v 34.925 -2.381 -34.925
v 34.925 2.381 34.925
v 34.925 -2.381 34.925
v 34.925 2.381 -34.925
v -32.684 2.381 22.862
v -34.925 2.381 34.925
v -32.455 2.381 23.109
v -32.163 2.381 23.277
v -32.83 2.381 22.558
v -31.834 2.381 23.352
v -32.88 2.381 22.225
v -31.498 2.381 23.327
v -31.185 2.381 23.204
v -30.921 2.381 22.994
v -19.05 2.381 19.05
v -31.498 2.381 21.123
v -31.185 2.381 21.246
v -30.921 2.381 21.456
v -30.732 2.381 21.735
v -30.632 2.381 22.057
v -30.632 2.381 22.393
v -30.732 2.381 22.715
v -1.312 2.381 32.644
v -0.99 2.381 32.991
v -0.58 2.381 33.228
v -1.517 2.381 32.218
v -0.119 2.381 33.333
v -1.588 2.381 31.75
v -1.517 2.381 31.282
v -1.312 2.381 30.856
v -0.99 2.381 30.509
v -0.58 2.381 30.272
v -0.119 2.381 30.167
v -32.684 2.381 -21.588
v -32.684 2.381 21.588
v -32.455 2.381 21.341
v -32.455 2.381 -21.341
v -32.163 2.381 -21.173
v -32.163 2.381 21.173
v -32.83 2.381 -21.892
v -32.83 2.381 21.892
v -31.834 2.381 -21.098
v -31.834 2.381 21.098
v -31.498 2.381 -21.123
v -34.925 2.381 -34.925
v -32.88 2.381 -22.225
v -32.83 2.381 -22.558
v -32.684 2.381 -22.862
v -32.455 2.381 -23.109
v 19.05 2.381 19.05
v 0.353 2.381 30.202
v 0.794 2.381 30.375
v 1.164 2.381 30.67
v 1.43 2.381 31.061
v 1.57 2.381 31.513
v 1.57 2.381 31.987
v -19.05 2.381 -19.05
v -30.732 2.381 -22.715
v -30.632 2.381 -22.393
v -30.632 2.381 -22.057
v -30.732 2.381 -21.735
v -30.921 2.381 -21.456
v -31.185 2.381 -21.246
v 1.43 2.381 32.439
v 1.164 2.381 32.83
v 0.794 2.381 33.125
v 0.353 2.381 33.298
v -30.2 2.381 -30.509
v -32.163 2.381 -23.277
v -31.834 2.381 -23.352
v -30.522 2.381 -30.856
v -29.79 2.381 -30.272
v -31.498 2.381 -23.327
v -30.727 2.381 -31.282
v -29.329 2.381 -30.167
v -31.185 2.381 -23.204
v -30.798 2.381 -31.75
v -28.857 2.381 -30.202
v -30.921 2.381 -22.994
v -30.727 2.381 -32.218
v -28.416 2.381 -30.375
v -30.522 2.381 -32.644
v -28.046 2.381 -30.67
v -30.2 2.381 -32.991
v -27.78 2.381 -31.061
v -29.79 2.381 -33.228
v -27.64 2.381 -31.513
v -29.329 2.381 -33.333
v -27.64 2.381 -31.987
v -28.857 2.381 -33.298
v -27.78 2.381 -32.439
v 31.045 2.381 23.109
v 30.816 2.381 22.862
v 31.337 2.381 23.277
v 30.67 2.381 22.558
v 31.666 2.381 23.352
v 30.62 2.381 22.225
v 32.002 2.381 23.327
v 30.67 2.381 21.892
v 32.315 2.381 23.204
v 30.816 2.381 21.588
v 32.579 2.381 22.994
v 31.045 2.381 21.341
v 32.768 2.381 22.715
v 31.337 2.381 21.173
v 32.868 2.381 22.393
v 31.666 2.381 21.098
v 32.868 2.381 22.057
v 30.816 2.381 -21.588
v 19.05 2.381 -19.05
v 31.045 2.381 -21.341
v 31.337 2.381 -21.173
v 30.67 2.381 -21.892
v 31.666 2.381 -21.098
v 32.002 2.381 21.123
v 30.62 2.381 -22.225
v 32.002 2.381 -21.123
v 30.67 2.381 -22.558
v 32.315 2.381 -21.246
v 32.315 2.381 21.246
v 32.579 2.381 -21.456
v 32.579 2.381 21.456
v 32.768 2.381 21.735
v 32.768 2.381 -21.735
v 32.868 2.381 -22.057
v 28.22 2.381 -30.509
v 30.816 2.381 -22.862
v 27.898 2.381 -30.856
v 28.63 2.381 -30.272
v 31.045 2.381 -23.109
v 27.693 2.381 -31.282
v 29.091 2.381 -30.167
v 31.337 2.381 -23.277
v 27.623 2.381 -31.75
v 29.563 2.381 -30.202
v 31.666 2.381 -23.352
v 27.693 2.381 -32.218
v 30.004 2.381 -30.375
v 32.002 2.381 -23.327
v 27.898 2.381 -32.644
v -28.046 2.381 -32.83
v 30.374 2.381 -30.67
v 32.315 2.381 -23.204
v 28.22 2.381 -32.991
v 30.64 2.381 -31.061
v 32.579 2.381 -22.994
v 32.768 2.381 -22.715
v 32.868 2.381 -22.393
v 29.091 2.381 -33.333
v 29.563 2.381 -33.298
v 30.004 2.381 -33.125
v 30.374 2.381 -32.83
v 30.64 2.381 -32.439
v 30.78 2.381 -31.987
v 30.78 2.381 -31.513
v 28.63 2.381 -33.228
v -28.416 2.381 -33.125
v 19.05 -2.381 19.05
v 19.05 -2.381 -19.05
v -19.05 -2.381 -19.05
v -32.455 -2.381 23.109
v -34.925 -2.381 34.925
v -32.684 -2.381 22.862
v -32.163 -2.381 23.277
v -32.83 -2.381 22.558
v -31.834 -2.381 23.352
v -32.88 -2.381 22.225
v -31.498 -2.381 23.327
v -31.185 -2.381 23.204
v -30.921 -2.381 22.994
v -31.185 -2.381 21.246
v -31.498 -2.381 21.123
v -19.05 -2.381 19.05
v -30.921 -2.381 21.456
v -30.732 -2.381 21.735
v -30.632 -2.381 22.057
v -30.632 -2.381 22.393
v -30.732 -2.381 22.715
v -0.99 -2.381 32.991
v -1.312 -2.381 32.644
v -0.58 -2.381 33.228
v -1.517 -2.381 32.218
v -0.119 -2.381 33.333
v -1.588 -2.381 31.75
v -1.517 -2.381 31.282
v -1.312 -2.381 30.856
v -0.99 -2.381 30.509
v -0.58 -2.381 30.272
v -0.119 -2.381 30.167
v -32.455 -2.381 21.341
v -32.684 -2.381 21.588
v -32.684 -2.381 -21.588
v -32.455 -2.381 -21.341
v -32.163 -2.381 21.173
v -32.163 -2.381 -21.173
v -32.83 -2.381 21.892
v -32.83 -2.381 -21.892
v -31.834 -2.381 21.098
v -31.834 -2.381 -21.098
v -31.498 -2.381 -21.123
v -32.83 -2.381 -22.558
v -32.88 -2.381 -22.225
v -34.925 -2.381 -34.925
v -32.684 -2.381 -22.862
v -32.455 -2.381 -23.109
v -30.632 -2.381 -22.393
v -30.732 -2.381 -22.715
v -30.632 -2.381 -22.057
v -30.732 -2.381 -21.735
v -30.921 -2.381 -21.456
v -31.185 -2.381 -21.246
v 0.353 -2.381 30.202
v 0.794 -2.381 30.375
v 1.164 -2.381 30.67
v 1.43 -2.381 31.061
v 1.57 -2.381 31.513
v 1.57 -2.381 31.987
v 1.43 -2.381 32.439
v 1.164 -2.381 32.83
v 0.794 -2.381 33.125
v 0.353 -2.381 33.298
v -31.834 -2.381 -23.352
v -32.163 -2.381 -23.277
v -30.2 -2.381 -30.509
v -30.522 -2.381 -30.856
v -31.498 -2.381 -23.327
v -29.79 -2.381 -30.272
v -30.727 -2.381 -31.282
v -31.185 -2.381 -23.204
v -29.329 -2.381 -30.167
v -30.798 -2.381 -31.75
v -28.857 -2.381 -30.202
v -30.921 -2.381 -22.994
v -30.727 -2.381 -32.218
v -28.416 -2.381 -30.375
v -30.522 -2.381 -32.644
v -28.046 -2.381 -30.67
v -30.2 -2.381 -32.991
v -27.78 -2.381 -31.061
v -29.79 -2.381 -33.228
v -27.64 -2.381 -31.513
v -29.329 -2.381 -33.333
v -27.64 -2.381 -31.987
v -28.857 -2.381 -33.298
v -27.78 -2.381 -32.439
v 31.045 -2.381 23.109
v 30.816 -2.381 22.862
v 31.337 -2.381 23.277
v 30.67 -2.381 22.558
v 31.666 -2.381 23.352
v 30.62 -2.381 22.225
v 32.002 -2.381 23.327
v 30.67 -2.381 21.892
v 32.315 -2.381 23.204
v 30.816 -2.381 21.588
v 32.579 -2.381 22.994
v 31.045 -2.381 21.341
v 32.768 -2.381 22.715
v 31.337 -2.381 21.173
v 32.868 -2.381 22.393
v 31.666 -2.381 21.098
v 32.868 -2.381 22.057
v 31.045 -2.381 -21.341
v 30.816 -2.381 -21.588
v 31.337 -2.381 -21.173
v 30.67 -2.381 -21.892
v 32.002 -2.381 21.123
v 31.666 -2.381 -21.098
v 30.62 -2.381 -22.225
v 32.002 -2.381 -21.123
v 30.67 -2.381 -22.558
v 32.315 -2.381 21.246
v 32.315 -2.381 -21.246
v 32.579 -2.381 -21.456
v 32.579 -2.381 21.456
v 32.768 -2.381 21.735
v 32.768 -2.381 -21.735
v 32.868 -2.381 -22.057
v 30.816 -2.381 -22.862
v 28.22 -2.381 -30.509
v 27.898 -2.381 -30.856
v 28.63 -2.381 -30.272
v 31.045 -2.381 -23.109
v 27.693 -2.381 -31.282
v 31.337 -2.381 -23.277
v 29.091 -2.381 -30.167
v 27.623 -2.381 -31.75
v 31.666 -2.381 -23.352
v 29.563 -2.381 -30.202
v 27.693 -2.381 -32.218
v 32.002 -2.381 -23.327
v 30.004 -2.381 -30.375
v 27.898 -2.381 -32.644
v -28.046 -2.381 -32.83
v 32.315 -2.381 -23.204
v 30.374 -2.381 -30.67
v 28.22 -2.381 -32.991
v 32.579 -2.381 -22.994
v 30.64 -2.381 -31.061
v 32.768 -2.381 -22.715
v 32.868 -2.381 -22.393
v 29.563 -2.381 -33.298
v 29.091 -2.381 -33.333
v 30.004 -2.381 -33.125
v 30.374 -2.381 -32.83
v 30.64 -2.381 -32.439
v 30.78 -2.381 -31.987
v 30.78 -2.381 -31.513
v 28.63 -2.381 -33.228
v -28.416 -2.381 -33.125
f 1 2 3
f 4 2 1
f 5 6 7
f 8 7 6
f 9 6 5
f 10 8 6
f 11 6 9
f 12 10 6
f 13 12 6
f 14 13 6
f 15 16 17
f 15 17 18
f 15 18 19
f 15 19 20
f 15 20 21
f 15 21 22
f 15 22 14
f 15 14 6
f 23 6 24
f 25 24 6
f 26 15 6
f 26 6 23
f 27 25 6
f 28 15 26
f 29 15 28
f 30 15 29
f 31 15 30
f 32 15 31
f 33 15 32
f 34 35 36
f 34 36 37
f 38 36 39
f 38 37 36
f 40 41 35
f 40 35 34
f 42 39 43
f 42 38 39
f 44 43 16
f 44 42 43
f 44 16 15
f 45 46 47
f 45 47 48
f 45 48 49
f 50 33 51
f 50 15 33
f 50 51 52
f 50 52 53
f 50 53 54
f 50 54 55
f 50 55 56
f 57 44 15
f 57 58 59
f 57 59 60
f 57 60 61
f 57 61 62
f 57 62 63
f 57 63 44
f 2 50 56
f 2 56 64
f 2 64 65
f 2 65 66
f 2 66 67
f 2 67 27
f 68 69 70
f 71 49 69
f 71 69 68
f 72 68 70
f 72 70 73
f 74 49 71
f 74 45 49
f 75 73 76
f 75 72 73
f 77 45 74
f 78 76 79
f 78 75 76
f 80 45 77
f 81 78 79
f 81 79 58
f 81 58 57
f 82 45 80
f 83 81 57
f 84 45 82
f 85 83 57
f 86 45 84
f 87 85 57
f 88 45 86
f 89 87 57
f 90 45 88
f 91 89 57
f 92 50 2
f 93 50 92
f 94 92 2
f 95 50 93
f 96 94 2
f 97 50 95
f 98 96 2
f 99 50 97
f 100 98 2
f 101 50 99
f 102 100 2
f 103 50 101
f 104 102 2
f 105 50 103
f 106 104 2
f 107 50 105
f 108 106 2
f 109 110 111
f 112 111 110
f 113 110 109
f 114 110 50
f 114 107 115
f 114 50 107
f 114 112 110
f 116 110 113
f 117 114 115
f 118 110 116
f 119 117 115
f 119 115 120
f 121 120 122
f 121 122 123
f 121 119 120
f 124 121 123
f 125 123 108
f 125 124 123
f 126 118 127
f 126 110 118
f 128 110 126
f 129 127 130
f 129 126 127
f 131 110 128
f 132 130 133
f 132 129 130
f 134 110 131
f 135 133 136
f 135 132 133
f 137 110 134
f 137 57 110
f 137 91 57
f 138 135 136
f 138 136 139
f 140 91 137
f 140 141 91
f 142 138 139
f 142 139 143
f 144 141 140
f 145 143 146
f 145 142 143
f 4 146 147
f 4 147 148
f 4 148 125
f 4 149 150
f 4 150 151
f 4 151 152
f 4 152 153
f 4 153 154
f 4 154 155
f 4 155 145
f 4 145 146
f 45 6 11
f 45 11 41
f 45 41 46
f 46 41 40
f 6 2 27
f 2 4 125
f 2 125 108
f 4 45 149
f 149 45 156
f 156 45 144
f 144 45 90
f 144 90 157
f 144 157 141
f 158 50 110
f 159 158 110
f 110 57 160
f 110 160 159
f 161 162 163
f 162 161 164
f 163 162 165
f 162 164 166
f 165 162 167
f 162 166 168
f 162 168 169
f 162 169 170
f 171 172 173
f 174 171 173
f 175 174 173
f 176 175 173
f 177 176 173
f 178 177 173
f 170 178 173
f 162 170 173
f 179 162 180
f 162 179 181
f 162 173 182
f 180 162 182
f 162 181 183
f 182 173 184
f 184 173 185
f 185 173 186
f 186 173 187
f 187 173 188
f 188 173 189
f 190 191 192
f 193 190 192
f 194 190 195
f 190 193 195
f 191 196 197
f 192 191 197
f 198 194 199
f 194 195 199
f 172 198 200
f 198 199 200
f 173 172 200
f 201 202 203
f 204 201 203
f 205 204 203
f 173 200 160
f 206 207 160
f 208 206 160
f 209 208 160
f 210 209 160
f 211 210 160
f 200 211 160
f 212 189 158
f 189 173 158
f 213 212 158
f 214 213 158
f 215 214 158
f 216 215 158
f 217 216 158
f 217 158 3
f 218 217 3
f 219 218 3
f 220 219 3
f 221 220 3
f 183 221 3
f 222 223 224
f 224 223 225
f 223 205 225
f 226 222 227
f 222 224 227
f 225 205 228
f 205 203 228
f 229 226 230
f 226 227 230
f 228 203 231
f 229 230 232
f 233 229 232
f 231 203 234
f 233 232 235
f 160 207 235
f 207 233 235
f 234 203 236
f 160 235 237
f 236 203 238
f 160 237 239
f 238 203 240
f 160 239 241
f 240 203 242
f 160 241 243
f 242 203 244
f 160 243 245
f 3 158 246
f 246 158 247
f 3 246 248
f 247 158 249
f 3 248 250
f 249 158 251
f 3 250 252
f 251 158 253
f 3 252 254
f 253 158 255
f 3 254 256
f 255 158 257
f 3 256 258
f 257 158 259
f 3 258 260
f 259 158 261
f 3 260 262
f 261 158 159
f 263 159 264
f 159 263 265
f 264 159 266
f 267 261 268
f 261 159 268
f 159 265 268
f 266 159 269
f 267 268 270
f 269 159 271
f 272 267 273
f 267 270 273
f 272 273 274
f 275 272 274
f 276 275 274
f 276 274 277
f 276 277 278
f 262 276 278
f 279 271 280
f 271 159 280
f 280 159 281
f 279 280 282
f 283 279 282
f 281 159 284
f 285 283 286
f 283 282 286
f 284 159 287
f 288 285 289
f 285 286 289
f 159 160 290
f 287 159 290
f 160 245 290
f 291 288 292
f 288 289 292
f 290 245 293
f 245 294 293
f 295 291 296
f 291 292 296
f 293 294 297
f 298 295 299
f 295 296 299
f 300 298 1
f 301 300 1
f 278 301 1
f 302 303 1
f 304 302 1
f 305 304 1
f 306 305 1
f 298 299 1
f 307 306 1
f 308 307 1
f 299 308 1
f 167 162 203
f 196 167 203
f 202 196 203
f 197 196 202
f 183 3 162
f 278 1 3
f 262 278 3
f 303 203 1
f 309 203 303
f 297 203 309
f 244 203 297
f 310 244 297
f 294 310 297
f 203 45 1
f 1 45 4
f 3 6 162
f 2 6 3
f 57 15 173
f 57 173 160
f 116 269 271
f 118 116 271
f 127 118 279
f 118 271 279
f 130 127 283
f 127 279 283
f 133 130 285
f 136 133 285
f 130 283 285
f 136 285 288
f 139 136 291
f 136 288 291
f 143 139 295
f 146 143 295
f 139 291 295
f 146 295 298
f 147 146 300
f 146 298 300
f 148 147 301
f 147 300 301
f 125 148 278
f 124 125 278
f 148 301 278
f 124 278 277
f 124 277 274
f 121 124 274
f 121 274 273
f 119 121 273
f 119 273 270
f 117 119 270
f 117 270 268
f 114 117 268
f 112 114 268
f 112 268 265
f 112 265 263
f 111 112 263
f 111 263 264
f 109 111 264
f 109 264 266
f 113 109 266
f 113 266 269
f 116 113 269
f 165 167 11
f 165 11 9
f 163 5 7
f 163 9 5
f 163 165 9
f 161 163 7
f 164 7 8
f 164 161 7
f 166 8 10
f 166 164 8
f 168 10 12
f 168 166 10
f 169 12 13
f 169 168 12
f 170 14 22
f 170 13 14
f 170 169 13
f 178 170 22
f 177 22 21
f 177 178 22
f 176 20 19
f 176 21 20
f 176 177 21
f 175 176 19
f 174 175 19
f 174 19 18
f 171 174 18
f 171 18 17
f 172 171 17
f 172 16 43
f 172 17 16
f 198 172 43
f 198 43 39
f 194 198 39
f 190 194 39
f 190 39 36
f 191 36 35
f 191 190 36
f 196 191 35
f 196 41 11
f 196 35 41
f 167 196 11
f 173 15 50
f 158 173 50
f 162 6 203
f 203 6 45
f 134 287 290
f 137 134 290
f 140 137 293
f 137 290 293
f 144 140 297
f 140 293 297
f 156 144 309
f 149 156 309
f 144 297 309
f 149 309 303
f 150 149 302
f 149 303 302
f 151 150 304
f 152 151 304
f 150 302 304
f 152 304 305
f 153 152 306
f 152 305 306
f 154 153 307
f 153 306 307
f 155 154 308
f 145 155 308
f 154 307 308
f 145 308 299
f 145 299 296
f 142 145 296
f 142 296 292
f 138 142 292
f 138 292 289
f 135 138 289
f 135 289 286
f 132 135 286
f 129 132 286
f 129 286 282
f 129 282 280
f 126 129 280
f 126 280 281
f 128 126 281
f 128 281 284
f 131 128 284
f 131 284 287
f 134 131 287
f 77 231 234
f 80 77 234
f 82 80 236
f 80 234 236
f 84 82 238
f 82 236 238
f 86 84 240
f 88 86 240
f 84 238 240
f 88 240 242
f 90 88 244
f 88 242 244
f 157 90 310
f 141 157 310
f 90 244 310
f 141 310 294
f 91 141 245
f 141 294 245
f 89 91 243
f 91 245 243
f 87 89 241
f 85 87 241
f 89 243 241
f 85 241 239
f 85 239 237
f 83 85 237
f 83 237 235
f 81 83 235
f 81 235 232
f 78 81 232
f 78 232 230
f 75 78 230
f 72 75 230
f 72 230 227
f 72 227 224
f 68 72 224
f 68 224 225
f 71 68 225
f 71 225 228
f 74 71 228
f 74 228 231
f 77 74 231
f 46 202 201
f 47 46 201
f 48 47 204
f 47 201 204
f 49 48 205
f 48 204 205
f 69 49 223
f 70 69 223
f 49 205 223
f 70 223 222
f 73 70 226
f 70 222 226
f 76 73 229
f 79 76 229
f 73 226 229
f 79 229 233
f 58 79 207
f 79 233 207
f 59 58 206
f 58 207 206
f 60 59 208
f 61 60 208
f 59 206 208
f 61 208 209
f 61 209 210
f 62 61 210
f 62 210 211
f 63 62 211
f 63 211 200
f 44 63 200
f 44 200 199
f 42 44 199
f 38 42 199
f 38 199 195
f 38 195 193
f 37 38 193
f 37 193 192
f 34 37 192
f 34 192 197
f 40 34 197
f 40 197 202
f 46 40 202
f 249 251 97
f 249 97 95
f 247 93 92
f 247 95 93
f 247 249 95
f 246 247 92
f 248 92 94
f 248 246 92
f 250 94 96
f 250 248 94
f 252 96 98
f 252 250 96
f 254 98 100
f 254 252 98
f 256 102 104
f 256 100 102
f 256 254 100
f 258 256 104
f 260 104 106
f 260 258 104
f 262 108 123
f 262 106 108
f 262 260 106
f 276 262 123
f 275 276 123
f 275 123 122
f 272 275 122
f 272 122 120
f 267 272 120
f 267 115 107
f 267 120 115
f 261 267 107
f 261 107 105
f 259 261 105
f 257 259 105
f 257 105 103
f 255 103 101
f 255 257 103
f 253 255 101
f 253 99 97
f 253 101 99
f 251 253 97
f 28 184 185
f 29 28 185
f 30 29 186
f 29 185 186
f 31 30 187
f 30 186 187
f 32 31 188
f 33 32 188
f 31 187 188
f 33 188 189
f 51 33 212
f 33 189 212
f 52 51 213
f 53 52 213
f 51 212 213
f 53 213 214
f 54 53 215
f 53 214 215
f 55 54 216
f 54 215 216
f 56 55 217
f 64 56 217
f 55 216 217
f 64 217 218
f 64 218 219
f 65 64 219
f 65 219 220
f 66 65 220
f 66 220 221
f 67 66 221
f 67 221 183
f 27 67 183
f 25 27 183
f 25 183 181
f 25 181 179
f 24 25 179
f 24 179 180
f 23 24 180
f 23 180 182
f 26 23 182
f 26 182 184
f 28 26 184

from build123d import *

# Parameters (mm, degrees)
SKETCH1_W                    = 69.85
SKETCH1_H                    = 69.85
BOSS_EXTRUDE1_DEPTH          = 2.38125
CUT_EXTRUDE1_REACH           = 51.62
SKETCH2_W                    = 38.1
SKETCH2_H                    = 38.1
F_4_40_TAPPED_HOLE1_D        = 2.2606
F_1_8_0_125_DIAMETER_HOLE1_D = 3.175


with BuildPart() as part:
    # Sketch1 → Boss-Extrude1 (new, symmetric)
    with BuildSketch(Plane(origin=(0, 0, 0), x_dir=(1, 0, 0), z_dir=(0, 1, 0))):
        Rectangle(SKETCH1_W, SKETCH1_H)
    extrude(amount=BOSS_EXTRUDE1_DEPTH, both=True)

    # Sketch2 → Cut-Extrude1 (cut, up to next)
    with BuildSketch(Plane(origin=(0, 2.38125, 0), x_dir=(1, 0, 0), z_dir=(0, 1, 0)), mode=Mode.PRIVATE) as cut_extrude1_sk1:
        Rectangle(SKETCH2_W, SKETCH2_H)
    cut_extrude1_tool1 = extrude(cut_extrude1_sk1.sketch, amount=-CUT_EXTRUDE1_REACH, mode=Mode.PRIVATE) & part.part
    add(cut_extrude1_tool1.solids().sort_by_distance((0, 2.38125, 0))[0], mode=Mode.SUBTRACT)

    # #4-40 Tapped Hole1 (through all)
    with Locations(Plane(origin=(0, 2.38125, 0), x_dir=(1, 0, 0), z_dir=(0, 1, 0))):
        with Locations((-31.75, 22.225), (31.75, 22.225)):
            f_4_40_tapped_hole1 = Hole(F_4_40_TAPPED_HOLE1_D / 2)

    # 1/8 (0.125) Diameter Hole1 (through all)
    with Locations(Plane(origin=(0, 2.38125, 0), x_dir=(1, 0, 0), z_dir=(0, 1, 0))):
        with Locations((-29.21, 31.75), (29.21, 31.75), (0, -31.75)):
            Hole(F_1_8_0_125_DIAMETER_HOLE1_D / 2)

    # Mirror1: #4-40 Tapped Hole1 across plane
    add(f_4_40_tapped_hole1.mirror(Plane.XY), mode=Mode.SUBTRACT)


solid = part.part
